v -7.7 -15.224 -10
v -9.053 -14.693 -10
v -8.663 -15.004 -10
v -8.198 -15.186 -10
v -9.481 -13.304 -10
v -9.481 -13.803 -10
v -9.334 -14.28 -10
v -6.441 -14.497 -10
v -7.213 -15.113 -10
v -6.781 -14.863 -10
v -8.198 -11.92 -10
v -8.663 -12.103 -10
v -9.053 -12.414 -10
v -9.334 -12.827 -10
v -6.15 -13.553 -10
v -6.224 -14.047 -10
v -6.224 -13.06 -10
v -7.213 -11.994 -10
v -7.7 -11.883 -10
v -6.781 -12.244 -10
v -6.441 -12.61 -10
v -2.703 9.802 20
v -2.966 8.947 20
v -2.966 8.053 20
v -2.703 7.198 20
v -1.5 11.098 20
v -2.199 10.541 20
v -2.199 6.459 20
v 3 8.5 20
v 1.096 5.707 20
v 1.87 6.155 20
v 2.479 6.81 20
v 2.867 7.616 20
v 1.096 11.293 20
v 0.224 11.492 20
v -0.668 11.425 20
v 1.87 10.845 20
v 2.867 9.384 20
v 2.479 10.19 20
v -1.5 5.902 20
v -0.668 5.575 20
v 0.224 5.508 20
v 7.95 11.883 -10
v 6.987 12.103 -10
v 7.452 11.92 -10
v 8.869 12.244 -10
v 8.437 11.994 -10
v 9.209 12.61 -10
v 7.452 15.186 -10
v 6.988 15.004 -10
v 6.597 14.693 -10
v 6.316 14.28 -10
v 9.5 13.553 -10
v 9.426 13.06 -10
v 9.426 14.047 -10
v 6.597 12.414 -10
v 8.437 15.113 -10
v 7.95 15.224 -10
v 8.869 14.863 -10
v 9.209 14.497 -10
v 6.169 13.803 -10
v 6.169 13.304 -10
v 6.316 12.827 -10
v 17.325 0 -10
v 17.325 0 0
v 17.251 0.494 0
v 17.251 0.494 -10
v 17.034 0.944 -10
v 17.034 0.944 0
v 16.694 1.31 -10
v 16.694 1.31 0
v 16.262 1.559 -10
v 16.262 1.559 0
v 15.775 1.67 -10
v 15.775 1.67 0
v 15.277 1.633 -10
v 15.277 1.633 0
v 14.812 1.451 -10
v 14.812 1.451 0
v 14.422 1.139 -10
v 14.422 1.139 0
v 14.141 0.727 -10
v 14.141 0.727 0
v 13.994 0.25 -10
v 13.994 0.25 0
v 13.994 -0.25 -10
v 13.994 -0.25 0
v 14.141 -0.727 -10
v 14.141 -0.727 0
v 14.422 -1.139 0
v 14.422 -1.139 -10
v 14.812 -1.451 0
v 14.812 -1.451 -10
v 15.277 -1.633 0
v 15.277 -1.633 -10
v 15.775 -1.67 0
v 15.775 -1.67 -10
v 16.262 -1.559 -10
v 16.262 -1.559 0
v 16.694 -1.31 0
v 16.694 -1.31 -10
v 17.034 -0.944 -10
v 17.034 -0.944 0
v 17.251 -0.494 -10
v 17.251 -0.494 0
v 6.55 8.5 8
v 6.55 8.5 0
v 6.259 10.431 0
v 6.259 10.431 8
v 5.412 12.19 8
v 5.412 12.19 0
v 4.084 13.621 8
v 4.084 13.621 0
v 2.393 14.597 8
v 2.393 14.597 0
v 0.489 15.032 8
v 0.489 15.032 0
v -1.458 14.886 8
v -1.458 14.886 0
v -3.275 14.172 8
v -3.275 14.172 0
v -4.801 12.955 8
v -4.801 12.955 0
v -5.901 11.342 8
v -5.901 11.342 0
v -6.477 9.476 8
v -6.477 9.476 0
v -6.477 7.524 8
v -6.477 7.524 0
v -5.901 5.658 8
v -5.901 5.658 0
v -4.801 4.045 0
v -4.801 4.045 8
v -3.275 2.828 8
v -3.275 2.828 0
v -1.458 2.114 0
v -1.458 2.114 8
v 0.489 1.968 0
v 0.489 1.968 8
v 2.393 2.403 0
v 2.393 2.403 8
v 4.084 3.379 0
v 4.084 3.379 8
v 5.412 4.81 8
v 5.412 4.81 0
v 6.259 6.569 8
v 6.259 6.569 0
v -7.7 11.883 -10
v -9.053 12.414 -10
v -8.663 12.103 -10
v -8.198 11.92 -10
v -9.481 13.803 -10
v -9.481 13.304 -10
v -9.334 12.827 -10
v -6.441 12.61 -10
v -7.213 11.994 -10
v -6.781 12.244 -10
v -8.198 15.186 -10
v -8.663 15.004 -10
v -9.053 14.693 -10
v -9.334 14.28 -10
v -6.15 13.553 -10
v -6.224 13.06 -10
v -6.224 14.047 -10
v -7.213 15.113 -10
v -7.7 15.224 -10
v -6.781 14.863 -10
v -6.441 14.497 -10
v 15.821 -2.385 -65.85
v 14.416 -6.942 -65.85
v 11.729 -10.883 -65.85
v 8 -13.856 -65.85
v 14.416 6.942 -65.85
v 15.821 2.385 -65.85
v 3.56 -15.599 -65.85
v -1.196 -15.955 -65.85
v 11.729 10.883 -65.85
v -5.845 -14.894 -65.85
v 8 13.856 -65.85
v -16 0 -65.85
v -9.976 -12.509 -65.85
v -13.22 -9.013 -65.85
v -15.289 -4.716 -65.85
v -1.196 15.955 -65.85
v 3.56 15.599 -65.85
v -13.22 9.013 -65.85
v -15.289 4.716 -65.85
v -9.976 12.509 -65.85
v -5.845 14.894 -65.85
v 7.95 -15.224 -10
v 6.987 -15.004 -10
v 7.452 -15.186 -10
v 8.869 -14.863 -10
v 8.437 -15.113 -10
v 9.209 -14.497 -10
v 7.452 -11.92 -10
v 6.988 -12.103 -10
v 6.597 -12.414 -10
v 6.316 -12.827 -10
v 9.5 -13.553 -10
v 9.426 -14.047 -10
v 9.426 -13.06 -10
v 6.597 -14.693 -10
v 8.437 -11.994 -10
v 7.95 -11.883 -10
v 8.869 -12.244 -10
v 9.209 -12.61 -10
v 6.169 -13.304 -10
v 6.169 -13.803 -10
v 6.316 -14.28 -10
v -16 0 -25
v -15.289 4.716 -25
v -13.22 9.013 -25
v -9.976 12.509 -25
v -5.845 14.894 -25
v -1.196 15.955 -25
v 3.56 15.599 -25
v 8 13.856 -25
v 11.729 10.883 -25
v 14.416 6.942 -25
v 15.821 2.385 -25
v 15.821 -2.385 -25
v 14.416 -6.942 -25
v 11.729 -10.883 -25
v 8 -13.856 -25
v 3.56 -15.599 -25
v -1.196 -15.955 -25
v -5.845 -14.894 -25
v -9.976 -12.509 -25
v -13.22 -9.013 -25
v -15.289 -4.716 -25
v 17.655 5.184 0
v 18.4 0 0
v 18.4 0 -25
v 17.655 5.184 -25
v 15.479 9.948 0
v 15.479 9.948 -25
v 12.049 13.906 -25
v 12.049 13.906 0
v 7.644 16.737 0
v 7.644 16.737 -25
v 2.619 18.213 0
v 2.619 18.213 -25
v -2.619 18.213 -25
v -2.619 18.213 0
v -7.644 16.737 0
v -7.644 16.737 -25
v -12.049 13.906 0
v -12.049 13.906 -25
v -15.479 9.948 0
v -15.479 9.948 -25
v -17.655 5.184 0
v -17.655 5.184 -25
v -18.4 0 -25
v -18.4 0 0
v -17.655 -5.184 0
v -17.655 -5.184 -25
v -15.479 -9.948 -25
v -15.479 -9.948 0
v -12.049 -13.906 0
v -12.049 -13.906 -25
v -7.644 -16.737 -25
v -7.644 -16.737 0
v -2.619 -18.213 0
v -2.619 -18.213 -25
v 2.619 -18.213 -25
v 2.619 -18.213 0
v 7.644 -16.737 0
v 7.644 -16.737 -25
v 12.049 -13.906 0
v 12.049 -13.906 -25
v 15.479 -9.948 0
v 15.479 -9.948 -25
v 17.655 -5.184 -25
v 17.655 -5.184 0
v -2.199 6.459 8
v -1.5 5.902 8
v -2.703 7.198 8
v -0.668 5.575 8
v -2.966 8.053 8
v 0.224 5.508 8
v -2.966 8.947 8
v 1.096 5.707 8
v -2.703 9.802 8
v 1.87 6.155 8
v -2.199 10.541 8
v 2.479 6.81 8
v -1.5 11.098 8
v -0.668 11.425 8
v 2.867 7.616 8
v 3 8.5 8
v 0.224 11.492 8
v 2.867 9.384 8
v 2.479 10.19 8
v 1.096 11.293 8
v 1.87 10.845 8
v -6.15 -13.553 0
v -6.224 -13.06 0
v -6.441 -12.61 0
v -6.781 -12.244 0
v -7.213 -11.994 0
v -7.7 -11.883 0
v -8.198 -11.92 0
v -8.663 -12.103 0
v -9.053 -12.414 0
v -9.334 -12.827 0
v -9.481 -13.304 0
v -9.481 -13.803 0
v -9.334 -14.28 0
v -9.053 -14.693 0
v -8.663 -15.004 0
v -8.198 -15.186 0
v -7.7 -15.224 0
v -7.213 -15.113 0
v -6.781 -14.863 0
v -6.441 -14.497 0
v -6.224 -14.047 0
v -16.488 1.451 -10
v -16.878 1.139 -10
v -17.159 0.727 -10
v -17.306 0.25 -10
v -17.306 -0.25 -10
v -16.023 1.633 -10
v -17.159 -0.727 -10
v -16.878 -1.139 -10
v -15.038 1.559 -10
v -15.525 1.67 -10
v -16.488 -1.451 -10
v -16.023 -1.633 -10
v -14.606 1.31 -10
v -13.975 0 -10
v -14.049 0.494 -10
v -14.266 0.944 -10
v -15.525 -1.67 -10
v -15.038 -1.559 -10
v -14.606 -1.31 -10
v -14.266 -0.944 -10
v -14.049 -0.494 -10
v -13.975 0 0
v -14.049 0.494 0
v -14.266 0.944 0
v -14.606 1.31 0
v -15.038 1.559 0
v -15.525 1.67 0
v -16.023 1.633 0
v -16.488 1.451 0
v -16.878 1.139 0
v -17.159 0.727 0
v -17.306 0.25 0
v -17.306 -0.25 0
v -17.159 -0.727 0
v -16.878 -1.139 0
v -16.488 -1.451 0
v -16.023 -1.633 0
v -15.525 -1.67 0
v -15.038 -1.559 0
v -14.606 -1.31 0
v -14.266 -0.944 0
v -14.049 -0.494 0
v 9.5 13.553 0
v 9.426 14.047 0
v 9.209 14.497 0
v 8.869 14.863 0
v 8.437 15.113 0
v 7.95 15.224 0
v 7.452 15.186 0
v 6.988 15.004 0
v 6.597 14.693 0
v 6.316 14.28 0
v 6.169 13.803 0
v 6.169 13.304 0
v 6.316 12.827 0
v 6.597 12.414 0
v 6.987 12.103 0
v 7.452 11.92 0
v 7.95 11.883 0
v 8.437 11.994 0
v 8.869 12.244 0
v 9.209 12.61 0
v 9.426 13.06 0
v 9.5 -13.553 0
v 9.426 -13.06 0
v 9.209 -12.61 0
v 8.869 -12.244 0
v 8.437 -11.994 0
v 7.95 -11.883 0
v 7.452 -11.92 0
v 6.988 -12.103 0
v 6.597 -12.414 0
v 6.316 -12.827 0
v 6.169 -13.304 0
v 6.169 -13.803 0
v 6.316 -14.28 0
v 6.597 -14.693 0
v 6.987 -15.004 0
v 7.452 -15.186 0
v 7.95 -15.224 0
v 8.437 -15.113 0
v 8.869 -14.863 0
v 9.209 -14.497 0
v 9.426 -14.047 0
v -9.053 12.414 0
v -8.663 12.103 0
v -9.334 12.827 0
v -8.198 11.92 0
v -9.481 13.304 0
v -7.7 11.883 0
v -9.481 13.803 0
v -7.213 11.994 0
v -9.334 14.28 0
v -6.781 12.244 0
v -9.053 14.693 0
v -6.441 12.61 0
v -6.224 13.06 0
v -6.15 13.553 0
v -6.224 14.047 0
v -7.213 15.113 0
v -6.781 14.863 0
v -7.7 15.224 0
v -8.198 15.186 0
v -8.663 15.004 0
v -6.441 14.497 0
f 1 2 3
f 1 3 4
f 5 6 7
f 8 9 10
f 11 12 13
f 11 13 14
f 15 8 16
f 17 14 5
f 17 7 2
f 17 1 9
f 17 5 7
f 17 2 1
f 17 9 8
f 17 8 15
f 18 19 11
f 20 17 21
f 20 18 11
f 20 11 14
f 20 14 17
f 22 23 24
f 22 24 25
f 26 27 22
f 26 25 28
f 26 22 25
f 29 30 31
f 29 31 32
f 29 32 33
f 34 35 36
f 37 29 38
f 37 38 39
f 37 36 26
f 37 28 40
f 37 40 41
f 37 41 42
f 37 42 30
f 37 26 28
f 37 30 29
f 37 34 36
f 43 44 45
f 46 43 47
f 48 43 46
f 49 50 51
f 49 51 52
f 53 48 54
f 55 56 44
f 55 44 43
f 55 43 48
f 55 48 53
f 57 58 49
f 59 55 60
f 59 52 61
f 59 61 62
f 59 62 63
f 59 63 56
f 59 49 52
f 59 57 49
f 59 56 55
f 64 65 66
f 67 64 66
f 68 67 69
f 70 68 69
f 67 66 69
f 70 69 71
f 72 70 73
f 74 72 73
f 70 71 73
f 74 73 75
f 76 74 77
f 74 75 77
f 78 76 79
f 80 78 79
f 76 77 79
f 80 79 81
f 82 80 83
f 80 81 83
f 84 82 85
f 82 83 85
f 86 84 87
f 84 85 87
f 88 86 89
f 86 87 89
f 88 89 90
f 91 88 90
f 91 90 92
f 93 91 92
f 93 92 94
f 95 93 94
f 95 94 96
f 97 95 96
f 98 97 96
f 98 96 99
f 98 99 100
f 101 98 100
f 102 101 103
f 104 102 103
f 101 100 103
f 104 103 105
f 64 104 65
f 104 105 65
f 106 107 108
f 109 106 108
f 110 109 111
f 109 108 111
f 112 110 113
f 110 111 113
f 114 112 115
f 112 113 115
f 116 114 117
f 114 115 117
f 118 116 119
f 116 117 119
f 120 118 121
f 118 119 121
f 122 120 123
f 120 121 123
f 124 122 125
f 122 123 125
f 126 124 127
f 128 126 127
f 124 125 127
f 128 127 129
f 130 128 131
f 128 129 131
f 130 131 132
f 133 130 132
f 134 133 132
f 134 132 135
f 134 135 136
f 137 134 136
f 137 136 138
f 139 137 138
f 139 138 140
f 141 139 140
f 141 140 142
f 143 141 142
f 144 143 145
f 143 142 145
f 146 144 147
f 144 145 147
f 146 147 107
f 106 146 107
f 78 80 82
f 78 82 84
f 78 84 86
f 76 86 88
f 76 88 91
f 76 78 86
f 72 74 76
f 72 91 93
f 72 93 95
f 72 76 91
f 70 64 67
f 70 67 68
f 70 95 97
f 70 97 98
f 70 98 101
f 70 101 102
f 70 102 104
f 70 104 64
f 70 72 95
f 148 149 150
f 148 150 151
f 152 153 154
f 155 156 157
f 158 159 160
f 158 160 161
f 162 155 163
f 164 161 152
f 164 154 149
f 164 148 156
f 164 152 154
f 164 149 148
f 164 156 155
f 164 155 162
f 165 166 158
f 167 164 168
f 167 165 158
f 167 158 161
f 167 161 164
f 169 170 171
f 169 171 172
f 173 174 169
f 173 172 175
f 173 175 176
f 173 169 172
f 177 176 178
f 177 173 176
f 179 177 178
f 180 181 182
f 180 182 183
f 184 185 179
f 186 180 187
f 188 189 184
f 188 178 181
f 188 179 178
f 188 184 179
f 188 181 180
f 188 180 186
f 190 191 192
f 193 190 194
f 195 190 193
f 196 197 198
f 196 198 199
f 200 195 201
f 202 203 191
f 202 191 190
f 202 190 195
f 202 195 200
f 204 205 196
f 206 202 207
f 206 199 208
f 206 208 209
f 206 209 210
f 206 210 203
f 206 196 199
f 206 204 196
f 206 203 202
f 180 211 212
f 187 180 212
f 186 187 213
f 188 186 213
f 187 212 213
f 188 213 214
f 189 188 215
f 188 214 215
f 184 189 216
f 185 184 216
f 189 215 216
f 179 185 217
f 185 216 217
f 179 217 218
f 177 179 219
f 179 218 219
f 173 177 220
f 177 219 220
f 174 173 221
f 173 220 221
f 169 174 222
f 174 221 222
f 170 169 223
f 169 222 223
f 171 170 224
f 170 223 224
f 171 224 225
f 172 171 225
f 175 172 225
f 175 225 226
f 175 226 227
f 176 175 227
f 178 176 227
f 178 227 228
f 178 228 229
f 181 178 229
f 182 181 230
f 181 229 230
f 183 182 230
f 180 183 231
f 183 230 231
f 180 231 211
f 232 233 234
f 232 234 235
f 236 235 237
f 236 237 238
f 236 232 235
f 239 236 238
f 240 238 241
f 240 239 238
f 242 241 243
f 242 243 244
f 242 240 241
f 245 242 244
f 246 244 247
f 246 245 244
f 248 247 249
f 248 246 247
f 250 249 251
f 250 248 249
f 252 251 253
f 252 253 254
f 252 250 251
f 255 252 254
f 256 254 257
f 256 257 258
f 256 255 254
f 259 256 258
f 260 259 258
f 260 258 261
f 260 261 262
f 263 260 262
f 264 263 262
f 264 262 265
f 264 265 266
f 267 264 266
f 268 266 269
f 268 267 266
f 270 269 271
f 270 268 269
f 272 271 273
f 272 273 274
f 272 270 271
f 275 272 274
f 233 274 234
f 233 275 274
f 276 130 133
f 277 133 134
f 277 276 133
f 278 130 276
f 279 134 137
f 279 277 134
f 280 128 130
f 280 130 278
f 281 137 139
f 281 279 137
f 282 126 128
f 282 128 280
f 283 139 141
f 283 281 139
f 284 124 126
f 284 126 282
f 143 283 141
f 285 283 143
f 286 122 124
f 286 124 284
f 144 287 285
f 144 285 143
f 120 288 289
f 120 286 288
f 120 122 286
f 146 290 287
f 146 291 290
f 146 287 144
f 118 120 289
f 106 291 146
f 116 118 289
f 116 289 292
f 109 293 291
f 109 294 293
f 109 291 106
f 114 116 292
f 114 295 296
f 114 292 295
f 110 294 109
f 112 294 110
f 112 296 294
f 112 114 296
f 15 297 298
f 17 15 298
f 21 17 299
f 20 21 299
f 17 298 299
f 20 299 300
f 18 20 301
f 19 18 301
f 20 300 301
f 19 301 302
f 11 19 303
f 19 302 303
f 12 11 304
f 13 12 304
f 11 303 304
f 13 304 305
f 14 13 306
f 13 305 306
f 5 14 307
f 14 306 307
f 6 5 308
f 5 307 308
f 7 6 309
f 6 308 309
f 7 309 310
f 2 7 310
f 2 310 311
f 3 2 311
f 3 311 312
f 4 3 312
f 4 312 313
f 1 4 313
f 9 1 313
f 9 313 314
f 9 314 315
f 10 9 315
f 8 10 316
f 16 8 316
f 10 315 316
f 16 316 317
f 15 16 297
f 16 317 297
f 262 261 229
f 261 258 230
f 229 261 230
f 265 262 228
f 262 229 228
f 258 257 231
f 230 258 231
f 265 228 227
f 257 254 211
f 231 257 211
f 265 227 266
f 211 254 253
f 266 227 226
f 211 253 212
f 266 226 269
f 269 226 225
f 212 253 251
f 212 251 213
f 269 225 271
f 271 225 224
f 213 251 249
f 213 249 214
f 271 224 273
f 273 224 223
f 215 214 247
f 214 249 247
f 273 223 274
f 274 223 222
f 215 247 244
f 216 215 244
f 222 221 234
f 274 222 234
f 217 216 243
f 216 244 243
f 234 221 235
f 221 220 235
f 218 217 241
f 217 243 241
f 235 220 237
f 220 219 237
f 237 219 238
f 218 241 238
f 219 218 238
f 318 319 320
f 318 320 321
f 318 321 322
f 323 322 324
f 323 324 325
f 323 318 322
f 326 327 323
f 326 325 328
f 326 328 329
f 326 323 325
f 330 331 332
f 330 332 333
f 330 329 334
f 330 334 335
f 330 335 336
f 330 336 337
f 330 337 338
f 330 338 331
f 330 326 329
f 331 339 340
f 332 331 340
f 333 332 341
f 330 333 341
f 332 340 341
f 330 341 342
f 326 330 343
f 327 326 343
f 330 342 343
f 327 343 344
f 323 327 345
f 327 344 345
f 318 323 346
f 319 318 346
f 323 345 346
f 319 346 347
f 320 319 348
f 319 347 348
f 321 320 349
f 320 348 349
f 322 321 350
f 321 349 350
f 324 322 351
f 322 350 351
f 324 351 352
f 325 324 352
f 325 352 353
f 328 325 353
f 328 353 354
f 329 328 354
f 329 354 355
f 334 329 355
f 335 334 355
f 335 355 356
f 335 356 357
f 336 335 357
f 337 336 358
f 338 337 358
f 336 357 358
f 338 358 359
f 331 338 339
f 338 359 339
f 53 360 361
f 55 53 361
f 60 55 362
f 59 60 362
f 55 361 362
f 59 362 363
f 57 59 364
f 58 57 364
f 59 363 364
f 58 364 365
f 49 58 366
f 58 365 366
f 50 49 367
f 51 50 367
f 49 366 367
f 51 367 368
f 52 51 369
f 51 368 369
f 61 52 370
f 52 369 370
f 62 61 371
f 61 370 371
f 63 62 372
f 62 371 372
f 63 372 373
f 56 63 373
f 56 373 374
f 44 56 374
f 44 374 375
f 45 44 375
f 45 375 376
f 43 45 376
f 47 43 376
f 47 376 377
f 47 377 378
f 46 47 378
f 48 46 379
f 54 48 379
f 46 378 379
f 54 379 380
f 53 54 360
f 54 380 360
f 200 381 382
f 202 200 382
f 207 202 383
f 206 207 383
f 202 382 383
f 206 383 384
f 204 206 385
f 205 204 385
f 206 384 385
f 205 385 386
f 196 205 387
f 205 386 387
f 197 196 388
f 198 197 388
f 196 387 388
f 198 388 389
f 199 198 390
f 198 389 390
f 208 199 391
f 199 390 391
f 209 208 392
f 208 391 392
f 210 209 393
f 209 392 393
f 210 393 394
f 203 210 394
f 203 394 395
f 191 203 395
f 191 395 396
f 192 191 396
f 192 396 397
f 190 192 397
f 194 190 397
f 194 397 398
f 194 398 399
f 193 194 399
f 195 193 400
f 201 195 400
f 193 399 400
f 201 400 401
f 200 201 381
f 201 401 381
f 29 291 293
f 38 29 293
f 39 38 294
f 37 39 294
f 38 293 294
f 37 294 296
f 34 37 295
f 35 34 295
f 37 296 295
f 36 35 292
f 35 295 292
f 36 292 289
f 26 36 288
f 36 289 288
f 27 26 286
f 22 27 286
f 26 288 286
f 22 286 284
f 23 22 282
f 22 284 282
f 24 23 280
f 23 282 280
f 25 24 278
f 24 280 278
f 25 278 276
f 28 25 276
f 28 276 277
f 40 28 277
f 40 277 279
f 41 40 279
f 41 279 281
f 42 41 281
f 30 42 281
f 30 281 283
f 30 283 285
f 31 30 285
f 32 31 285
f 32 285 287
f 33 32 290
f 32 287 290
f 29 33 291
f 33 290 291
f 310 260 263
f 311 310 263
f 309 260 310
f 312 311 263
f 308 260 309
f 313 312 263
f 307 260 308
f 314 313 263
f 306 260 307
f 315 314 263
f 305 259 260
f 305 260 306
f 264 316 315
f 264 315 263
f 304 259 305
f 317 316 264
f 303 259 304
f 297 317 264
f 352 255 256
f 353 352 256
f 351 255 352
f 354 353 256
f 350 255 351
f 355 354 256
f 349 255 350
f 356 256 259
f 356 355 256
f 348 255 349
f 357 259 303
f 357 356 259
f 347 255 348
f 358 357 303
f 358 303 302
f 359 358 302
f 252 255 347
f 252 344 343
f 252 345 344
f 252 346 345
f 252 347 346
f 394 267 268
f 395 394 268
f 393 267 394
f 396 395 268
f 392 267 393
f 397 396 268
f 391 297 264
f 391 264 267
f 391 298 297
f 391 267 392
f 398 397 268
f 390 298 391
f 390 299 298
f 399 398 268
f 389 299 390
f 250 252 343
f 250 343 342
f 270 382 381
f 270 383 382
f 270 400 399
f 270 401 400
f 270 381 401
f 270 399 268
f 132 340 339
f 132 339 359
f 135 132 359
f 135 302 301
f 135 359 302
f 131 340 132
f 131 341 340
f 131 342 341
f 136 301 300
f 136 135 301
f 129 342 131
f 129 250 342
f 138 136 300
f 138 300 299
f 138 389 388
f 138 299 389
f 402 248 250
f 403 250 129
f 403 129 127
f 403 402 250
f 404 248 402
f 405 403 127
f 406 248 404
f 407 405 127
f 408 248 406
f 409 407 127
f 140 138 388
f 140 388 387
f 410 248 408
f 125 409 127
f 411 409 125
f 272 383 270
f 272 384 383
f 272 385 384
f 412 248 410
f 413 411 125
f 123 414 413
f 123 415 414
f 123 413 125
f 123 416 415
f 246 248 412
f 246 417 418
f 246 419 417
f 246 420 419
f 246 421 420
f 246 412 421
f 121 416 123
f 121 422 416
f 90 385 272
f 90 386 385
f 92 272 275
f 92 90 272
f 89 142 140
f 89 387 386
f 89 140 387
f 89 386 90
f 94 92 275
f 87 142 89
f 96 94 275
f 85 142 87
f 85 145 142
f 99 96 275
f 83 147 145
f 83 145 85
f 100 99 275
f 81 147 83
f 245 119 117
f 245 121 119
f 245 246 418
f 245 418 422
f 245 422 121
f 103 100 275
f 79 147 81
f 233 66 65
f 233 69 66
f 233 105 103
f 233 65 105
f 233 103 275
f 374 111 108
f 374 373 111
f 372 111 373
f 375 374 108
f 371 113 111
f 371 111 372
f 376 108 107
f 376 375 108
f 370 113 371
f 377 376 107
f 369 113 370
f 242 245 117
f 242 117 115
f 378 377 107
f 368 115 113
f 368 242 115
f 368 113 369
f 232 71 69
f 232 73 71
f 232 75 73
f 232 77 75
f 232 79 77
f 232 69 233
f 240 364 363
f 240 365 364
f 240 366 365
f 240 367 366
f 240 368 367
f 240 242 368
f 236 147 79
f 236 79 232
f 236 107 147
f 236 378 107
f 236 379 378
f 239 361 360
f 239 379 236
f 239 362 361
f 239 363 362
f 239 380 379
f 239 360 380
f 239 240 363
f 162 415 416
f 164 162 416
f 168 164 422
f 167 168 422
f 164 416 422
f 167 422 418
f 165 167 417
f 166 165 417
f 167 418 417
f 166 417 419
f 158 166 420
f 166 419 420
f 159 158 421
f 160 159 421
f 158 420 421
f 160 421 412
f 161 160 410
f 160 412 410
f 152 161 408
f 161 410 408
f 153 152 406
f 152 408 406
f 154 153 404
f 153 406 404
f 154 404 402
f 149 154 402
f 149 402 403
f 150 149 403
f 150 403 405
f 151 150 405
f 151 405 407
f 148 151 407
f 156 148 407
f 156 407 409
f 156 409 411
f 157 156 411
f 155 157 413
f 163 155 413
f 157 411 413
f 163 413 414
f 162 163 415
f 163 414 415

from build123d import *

# Parameters (mm, degrees)
SKETCH1_R           = 18.4
BOSS_EXTRUDE1_DEPTH = 25
SKETCH2_R           = 16
BOSS_EXTRUDE2_DEPTH = 40.85
SKETCH3_R           = 1.675
CUT_EXTRUDE1_DEPTH  = 10
SKETCH4_R           = 6.55
BOSS_EXTRUDE3_DEPTH = 8
SKETCH5_R           = 3
BOSS_EXTRUDE4_DEPTH = 12


with BuildPart() as part:
    # Sketch1 → Boss-Extrude1 (new body)
    with BuildSketch(Plane.XY):
        Circle(SKETCH1_R)
    extrude(amount=-BOSS_EXTRUDE1_DEPTH)

    # Sketch2 → Boss-Extrude2 (add)
    with BuildSketch(Plane(origin=(0, 0, -25), x_dir=(-1, 0, 0), z_dir=(0, 0, -1))):
        Circle(SKETCH2_R)
    extrude(amount=BOSS_EXTRUDE2_DEPTH)

    # Sketch3 → Cut-Extrude1 (cut)
    with BuildSketch(Plane.XY):
        with Locations((15.65, 0)):
            Circle(SKETCH3_R)
        with Locations((7.825, -13.553297569)):
            Circle(SKETCH3_R)
        with Locations((-7.825, -13.553297569)):
            Circle(SKETCH3_R)
        with Locations((-15.65, 0)):
            Circle(SKETCH3_R)
        with Locations((-7.825, 13.553297569)):
            Circle(SKETCH3_R)
        with Locations((7.825, 13.553297569)):
            Circle(SKETCH3_R)
    extrude(amount=-CUT_EXTRUDE1_DEPTH, mode=Mode.SUBTRACT)

    # Sketch4 → Boss-Extrude3 (add)
    with BuildSketch(Plane.XY):
        with Locations((0, 8.5)):
            Circle(SKETCH4_R)
    extrude(amount=BOSS_EXTRUDE3_DEPTH)

    # Sketch5 → Boss-Extrude4 (add)
    with BuildSketch(Plane.XY.offset(8)):
        with Locations((0, 8.5)):
            Circle(SKETCH5_R)
    extrude(amount=BOSS_EXTRUDE4_DEPTH)


solid = part.part
